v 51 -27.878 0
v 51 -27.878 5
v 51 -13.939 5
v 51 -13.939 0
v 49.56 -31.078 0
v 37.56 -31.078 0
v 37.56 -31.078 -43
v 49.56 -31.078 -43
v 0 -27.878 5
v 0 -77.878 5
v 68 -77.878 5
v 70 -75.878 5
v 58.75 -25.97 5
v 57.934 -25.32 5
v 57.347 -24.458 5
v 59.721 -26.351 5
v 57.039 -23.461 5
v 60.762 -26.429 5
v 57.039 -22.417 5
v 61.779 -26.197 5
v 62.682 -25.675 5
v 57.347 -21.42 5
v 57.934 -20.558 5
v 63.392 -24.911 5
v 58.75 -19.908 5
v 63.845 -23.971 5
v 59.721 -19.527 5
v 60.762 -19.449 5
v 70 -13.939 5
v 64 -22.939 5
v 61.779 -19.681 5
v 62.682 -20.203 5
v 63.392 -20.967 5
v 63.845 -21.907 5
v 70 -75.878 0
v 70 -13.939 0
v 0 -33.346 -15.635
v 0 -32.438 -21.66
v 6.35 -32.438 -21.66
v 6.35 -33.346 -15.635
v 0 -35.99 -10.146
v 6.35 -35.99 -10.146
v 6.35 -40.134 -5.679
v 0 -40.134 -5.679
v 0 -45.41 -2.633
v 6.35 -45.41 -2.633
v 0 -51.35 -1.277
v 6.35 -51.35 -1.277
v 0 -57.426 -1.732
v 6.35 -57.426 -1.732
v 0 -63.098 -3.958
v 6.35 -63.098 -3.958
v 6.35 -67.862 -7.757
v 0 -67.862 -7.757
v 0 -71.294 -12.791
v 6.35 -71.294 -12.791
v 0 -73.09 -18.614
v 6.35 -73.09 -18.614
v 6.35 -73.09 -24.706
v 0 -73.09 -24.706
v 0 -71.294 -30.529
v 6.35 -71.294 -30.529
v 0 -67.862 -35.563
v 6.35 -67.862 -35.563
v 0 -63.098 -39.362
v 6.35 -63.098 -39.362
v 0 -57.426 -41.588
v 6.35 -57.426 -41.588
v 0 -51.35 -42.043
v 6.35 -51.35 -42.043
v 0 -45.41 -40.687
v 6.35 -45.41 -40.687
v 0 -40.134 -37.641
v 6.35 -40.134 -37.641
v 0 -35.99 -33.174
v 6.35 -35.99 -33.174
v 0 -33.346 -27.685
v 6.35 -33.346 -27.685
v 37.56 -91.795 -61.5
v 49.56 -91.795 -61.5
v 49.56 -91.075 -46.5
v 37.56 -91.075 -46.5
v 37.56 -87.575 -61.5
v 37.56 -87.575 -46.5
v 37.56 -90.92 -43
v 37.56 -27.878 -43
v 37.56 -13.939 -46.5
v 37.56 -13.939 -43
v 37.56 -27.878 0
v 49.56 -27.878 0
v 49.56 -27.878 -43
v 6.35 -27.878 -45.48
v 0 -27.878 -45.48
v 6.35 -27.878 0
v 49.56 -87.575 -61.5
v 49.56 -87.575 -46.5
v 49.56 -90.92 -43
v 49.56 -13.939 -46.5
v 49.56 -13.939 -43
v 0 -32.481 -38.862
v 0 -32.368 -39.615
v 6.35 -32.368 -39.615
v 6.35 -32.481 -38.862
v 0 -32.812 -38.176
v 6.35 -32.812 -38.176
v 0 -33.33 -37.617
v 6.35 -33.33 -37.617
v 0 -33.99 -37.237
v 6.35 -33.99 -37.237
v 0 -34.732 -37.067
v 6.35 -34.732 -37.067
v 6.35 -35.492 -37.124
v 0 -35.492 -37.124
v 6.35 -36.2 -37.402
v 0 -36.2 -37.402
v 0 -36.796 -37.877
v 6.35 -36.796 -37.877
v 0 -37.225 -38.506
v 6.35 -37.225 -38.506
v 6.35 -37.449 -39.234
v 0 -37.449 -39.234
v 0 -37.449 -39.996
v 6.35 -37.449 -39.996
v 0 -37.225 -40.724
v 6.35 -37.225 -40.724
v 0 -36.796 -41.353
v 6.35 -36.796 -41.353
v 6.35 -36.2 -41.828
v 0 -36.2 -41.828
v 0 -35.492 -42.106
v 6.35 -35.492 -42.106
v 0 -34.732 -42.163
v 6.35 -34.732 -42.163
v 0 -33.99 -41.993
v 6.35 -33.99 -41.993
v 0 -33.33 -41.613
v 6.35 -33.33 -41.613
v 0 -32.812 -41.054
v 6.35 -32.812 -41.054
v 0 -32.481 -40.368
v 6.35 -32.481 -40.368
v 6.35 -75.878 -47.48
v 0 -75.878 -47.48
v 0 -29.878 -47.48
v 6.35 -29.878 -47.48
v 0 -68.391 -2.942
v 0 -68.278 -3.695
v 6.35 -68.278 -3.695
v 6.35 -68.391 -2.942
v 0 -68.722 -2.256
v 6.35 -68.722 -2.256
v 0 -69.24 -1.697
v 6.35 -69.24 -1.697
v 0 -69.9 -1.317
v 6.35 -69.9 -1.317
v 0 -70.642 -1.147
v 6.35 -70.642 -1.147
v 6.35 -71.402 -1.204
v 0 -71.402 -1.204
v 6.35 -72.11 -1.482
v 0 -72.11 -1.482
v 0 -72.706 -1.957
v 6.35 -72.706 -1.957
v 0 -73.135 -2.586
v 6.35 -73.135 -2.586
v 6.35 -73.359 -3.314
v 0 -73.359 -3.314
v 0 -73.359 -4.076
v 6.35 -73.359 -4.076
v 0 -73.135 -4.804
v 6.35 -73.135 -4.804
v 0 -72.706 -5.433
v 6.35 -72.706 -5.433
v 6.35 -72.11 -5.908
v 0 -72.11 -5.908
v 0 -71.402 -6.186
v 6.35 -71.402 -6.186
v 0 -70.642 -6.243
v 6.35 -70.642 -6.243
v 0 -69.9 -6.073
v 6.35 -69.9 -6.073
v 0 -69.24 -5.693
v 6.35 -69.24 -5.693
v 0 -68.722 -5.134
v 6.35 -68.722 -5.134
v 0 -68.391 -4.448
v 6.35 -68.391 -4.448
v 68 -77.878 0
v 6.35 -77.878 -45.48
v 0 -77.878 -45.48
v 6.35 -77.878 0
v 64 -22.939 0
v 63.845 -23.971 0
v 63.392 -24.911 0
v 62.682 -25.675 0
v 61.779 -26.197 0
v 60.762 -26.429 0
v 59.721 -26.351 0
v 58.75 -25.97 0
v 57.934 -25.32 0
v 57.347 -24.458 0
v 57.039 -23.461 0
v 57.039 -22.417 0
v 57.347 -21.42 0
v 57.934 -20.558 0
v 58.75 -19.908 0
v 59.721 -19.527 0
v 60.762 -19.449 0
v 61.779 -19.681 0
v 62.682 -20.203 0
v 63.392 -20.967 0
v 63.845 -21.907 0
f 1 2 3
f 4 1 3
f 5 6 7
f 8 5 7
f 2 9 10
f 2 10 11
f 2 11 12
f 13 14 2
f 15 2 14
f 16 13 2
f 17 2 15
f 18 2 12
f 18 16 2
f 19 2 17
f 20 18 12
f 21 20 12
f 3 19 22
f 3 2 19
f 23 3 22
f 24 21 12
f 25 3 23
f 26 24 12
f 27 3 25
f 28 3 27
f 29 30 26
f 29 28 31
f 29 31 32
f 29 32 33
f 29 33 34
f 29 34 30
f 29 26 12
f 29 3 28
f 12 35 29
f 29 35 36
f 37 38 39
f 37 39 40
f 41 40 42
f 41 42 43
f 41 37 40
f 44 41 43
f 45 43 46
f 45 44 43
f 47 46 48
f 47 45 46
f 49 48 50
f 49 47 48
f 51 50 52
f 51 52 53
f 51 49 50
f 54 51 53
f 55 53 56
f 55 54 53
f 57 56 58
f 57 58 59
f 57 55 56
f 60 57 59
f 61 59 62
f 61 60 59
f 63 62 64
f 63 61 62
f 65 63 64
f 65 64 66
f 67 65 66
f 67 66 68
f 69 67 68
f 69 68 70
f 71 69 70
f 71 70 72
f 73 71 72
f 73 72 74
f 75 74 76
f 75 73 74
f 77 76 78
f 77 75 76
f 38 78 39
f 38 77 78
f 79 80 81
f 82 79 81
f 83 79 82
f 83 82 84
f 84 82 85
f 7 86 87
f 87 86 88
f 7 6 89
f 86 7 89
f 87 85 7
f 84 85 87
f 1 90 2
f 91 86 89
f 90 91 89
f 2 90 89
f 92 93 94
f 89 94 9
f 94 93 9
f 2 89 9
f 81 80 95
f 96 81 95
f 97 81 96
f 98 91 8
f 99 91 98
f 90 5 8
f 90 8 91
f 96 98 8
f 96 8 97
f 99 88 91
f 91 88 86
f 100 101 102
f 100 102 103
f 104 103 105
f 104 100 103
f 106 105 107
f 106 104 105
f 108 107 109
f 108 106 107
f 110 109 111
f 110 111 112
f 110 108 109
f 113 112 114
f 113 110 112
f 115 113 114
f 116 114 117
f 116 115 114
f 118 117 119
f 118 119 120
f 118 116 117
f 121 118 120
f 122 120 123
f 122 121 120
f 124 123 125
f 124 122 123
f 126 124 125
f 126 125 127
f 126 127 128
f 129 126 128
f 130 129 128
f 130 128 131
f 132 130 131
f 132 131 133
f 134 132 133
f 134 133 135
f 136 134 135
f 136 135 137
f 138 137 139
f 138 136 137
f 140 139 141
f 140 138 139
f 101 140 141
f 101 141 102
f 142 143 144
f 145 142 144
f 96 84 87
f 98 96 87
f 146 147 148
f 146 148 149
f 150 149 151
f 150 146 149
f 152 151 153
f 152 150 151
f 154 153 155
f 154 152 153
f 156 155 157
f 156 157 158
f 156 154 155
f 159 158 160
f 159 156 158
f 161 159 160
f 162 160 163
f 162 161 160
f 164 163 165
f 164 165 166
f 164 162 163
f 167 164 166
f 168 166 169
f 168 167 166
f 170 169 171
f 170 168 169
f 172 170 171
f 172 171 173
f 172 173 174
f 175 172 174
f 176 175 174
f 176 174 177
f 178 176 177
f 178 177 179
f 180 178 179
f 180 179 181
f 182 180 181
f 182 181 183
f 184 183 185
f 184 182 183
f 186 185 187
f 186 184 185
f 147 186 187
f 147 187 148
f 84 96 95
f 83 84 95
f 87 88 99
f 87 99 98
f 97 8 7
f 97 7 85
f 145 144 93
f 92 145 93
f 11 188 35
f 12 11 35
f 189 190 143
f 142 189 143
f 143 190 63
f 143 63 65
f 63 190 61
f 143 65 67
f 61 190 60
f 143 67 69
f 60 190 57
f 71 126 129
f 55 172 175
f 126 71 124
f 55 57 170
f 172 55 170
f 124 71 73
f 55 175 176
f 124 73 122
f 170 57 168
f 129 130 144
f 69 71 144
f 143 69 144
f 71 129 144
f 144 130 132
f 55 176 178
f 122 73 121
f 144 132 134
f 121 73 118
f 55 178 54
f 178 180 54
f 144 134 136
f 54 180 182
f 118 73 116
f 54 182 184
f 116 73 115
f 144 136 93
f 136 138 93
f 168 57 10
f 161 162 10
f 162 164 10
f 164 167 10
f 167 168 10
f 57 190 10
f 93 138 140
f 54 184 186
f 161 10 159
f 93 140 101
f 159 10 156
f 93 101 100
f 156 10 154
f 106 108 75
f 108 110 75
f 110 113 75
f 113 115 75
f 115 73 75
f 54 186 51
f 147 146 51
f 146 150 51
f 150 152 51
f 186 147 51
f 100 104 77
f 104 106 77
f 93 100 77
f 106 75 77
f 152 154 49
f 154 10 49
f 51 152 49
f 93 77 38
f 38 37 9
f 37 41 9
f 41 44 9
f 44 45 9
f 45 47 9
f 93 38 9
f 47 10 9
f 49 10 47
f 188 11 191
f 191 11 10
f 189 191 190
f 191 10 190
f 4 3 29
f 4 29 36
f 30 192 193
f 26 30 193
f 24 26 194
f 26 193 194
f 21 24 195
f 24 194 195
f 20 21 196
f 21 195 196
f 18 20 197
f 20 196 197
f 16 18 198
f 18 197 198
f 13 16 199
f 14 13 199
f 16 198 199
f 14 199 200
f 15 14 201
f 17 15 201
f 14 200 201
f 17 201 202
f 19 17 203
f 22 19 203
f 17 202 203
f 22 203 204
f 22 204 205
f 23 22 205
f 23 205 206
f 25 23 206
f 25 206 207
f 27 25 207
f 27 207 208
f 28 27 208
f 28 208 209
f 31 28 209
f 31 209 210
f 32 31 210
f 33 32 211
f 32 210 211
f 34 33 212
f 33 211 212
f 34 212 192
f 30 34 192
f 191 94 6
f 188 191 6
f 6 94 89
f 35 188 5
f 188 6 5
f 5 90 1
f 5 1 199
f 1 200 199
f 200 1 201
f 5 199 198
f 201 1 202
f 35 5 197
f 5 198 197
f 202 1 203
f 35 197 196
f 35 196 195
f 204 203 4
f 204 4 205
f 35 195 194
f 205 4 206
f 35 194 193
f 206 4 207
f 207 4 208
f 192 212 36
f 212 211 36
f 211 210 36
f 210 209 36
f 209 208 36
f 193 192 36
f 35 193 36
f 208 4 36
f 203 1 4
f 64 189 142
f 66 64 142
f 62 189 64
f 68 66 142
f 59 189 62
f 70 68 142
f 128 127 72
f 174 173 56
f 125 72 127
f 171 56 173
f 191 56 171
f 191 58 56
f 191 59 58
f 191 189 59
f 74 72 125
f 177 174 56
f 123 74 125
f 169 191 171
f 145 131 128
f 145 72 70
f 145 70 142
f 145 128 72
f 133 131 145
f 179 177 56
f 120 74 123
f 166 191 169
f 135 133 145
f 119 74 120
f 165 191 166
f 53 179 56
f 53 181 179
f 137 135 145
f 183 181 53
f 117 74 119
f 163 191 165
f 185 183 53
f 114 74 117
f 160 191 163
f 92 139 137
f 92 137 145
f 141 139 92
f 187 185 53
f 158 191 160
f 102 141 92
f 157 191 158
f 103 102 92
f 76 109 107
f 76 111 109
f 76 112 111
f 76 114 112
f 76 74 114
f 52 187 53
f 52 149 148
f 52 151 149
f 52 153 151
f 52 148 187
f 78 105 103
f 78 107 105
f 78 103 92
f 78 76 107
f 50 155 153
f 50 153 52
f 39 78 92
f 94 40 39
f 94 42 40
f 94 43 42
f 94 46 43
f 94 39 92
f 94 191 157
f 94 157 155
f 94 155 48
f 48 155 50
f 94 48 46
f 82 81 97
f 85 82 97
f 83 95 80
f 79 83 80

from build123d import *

# Parameters (mm, degrees)
BOSS_EXTRUDE1_DEPTH   = 5
SKETCH2_W             = 6.35
SKETCH2_H             = 50
BOSS_EXTRUDE2_DEPTH   = 52.48
CUT_EXTRUDE1_REACH    = 106.448
SKETCH3_R             = 20.44
SKETCH3_R_2           = 2.555
SKETCH3_W             = 5
SKETCH3_H             = 50
CUT_EXTRUDE2_REACH    = 108.104
SKETCH4_R             = 3.5
CUT_EXTRUDE6_REACH    = 108.104
SKETCH14_W            = 23.196263878
SKETCH14_H            = 15.316152196
SKETCH15_W            = 12
SKETCH15_H            = 3.2
BOSS_EXTRUDE7_DEPTH   = 46.5
BOSS_EXTRUDE8_REACH   = 98.667
SKETCH16_W            = 12
SKETCH16_H            = 3.5
SKETCH17_W            = 12
SKETCH17_H            = 3.5
BOSS_EXTRUDE9_DEPTH   = 15
CHAMFER2_SIZE         = 2
SKETCH22_W            = 12
SKETCH22_H            = 15
BOSS_EXTRUDE10_DEPTH  = 0.72
CUT_EXTRUDE8_REACH    = 103.606
CUT_EXTRUDE7_REACH    = 120.762
SKETCH18_R            = 3.25
MIRROR2_OUTLINE_W     = 50
MIRROR2_OUTLINE_H     = 5
MIRROR2_DEPTH         = 68
MIRROR2_2_OUTLINE_R   = 2.555
MIRROR2_2_OUTLINE_R_2 = 20.44
MIRROR2_2_DEPTH       = 6.35
MIRROR2_START         = 37.56
MIRROR2_3_DEPTH       = 12
MIRROR2_START_2       = 51
MIRROR2_4_OUTLINE_W   = 13.938985111
MIRROR2_4_OUTLINE_H   = 5
MIRROR2_4_DEPTH       = 5.9999999
MIRROR2_START_3       = 64.0000001
MIRROR2_5_OUTLINE_W   = 13.938985111
MIRROR2_5_OUTLINE_H   = 5
MIRROR2_5_DEPTH       = 5.9999999
MIRROR2_6_DEPTH       = 5
BOSS_EXTRUDE11_DEPTH  = 12
CUT_EXTRUDE9_REACH    = 132.799
SKETCH26_W            = 121.241742099
SKETCH26_H            = 103.992632166


with BuildPart() as part:
    # Sketch1 → Boss-Extrude1 (new body)
    with BuildSketch(Plane.XY):
        Polygon((0, 0), (0, 50), (51, 50), (51, 64.061014889), (70, 64.061014889), (70, -13.938985111), (51, -13.938985111), (51, 0), align=None)
    extrude(amount=BOSS_EXTRUDE1_DEPTH)

    # Sketch2 → Boss-Extrude2 (add)
    with BuildSketch(Plane(origin=(0, 0, 0), x_dir=(-1, 0, 0), z_dir=(0, 0, -1))):
        with Locations((-3.175, 25)):
            Rectangle(SKETCH2_W, SKETCH2_H)
    extrude(amount=BOSS_EXTRUDE2_DEPTH)

    # Sketch3 → Cut-Extrude1 (cut, up to next)
    with BuildSketch(Plane(origin=(6.35, 0, 0), x_dir=(0, 0, -1), z_dir=(1, 0, 0)), mode=Mode.PRIVATE) as cut_extrude1_sk1:
        with Locations((21.66, 25)):
            Circle(SKETCH3_R)
    cut_extrude1_tool1 = extrude(cut_extrude1_sk1.sketch, amount=-CUT_EXTRUDE1_REACH, mode=Mode.PRIVATE) & part.part
    # Sketch3 → Cut-Extrude1 (cut, up to next)
    with BuildSketch(Plane(origin=(6.35, 0, 0), x_dir=(0, 0, -1), z_dir=(1, 0, 0)), mode=Mode.PRIVATE) as cut_extrude1_sk2:
        with Locations((3.695, 42.955)):
            Circle(SKETCH3_R_2)
    cut_extrude1_tool2 = extrude(cut_extrude1_sk2.sketch, amount=-CUT_EXTRUDE1_REACH, mode=Mode.PRIVATE) & part.part
    # Sketch3 → Cut-Extrude1 (cut, up to next)
    with BuildSketch(Plane(origin=(6.35, 0, 0), x_dir=(0, 0, -1), z_dir=(1, 0, 0)), mode=Mode.PRIVATE) as cut_extrude1_sk3:
        with Locations((39.615, 7.045)):
            Circle(SKETCH3_R_2)
    cut_extrude1_tool3 = extrude(cut_extrude1_sk3.sketch, amount=-CUT_EXTRUDE1_REACH, mode=Mode.PRIVATE) & part.part
    # Sketch3 → Cut-Extrude1 (cut, up to next)
    with BuildSketch(Plane(origin=(6.35, 0, 0), x_dir=(0, 0, -1), z_dir=(1, 0, 0)), mode=Mode.PRIVATE) as cut_extrude1_sk4:
        with Locations((49.98, 25)):
            Rectangle(SKETCH3_W, SKETCH3_H)
    cut_extrude1_tool4 = extrude(cut_extrude1_sk4.sketch, amount=-CUT_EXTRUDE1_REACH, mode=Mode.PRIVATE) & part.part
    add(cut_extrude1_tool1.solids().sort_by_distance((6.35, 25, -21.66))[0], mode=Mode.SUBTRACT)
    add(cut_extrude1_tool2.solids().sort_by_distance((6.35, 42.955, -3.695))[0], mode=Mode.SUBTRACT)
    add(cut_extrude1_tool3.solids().sort_by_distance((6.35, 7.045, -39.615))[0], mode=Mode.SUBTRACT)
    add(cut_extrude1_tool4.solids().sort_by_distance((6.35, 25, -49.98))[0], mode=Mode.SUBTRACT)

    # Sketch4 → Cut-Extrude2 (cut, up to next)
    with BuildSketch(Plane(origin=(0, 0, 0), x_dir=(-1, 0, 0), z_dir=(0, 0, -1)), mode=Mode.PRIVATE) as cut_extrude2_sk1:
        with Locations((-60.5, 55.061014889)):
            Circle(SKETCH4_R)
    cut_extrude2_tool1 = extrude(cut_extrude2_sk1.sketch, amount=-CUT_EXTRUDE2_REACH, mode=Mode.PRIVATE) & part.part
    # Sketch4 → Cut-Extrude2 (cut, up to next)
    with BuildSketch(Plane(origin=(0, 0, 0), x_dir=(-1, 0, 0), z_dir=(0, 0, -1)), mode=Mode.PRIVATE) as cut_extrude2_sk2:
        with Locations((-60.5, -4.938985111)):
            Circle(SKETCH4_R)
    cut_extrude2_tool2 = extrude(cut_extrude2_sk2.sketch, amount=-CUT_EXTRUDE2_REACH, mode=Mode.PRIVATE) & part.part
    add(cut_extrude2_tool1.solids().sort_by_distance((60.5, 55.061015, 0))[0], mode=Mode.SUBTRACT)
    add(cut_extrude2_tool2.solids().sort_by_distance((60.5, -4.938985, 0))[0], mode=Mode.SUBTRACT)

    # Sketch14 → Cut-Extrude6 (cut, up to next)
    with BuildSketch(Plane(origin=(0, 0, 0), x_dir=(-1, 0, 0), z_dir=(0, 0, -1)), mode=Mode.PRIVATE) as cut_extrude6_sk1:
        with Locations((-62.598131939, 57.658076098)):
            Rectangle(SKETCH14_W, SKETCH14_H)
    cut_extrude6_tool1 = extrude(cut_extrude6_sk1.sketch, amount=-CUT_EXTRUDE6_REACH, mode=Mode.PRIVATE) & part.part
    add(cut_extrude6_tool1.solids().sort_by_distance((62.598132, 57.658076, 0))[0], mode=Mode.SUBTRACT)

    # Sketch15 → Boss-Extrude7 (add)
    with BuildSketch(Plane(origin=(0, 0, 0), x_dir=(-1, 0, 0), z_dir=(0, 0, -1))):
        with Locations((-43.56, 1.6)):
            Rectangle(SKETCH15_W, SKETCH15_H)
    extrude(amount=BOSS_EXTRUDE7_DEPTH)

    # Boss-Extrude8: up to this plane
    boss_extrude8_end = Plane(origin=(166.832994776, 64.085435133, -66.619565524), z_dir=(-1.1416993347548052e-15, 0.9990256874715413, 0.04413247978546202))
    # Sketch16 → Boss-Extrude8 (add, up to the surface)
    with BuildSketch(Plane(origin=(0, 3.2, 0), x_dir=(1, 0, 0), z_dir=(0, 1, 0)), mode=Mode.PRIVATE) as boss_extrude8_sk1:
        with Locations((43.56, 44.75)):
            Rectangle(SKETCH16_W, SKETCH16_H)
    boss_extrude8_tool1 = split(extrude(boss_extrude8_sk1.sketch, amount=BOSS_EXTRUDE8_REACH, mode=Mode.PRIVATE), bisect_by=boss_extrude8_end, keep=Keep.BOTH, mode=Mode.PRIVATE)
    add(boss_extrude8_tool1.solids().sort_by_distance((43.56, 3.2, -44.75))[0])

    # Sketch17 → Boss-Extrude9 (add)
    with BuildSketch(Plane(origin=(0, 0, -46.5), x_dir=(-1, 0, 0), z_dir=(0, 0, -1))):
        with Locations((-43.56, 61.446642853)):
            Rectangle(SKETCH17_W, SKETCH17_H)
    extrude(amount=BOSS_EXTRUDE9_DEPTH)

    # Chamfer2
    chamfer2_edges = [part.edges().sort_by_distance(p)[0] for p in [
        (3.175, 0, -47.48),
        (3.175, 50, -47.48),
        (70, 50, 2.5),
    ]]
    chamfer(chamfer2_edges, length=CHAMFER2_SIZE)

    # Sketch22 → Boss-Extrude10 (add)
    with BuildSketch(Plane(origin=(0, 63.196642853, 0), x_dir=(1, 0, 0), z_dir=(0, 1, 0))):
        with Locations((43.56, 54)):
            Rectangle(SKETCH22_W, SKETCH22_H)
    extrude(amount=BOSS_EXTRUDE10_DEPTH)

    # Sketch23 → Cut-Extrude8 (cut, up to next)
    with BuildSketch(Plane(origin=(49.56, 0, 0), x_dir=(0, 0, -1), z_dir=(1, 0, 0)), mode=Mode.PRIVATE) as cut_extrude8_sk1:
        Polygon((46.5, 63.916642853), (46.5, 63.196642853), (61.5, 63.916642853), align=None)
    cut_extrude8_tool1 = extrude(cut_extrude8_sk1.sketch, amount=-CUT_EXTRUDE8_REACH, mode=Mode.PRIVATE) & part.part
    add(cut_extrude8_tool1.solids().sort_by_distance((49.56, 63.676643, -51.5))[0], mode=Mode.SUBTRACT)

    # Cut-Extrude7: up to this plane
    cut_extrude7_end = Plane(origin=(-0.001, 63.196642853, -46.5), z_dir=(-2.1659106514416256e-15, -0.9988499868416298, -0.04794479936839813))
    # Sketch18 → Cut-Extrude7 (cut, up to the surface)
    with BuildSketch(Plane.XZ.offset(-59.696642853), mode=Mode.PRIVATE) as cut_extrude7_sk1:
        with Locations(Location((43.56, -52.57, 0), (0, 0, 270))):
            Circle(SKETCH18_R)
    cut_extrude7_tool1 = split(extrude(cut_extrude7_sk1.sketch, amount=-CUT_EXTRUDE7_REACH, mode=Mode.PRIVATE), bisect_by=cut_extrude7_end, keep=Keep.BOTH, mode=Mode.PRIVATE)
    add(cut_extrude7_tool1.solids().sort_by_distance((43.56, 59.696643, -52.57))[0], mode=Mode.SUBTRACT)



with BuildPart() as body_2:
    # Mirror2: read off the stored shape, not the designer's step
    # Mirror2 outline → Mirror2 (new body)
    with BuildSketch(Plane.YZ):
        with Locations((-52.877970222, 2.5)):
            Rectangle(MIRROR2_OUTLINE_W, MIRROR2_OUTLINE_H)
    extrude(amount=MIRROR2_DEPTH)

    # Mirror2 2 outline → Mirror2 2 (add)
    with BuildSketch(Plane.YZ):
        Polygon((-27.877970222, -45.48), (-27.877970222, 0), (-77.877970222, 0), (-77.877970222, -45.48), (-75.877970222, -47.48), (-29.877970222, -47.48), align=None)
        with Locations((-34.922970222, -39.615)):
            Circle(MIRROR2_2_OUTLINE_R, mode=Mode.SUBTRACT)
        with Locations((-70.832970222, -3.695)):
            Circle(MIRROR2_2_OUTLINE_R, mode=Mode.SUBTRACT)
        with Locations((-52.877970222, -21.66)):
            Circle(MIRROR2_2_OUTLINE_R_2, mode=Mode.SUBTRACT)
    extrude(amount=MIRROR2_2_DEPTH)


with BuildPart() as part_1:
    add(part.part)

    add(body_2.part)  # Mirror2 3 merges body 2
    # Mirror2 3 outline → Mirror2 3 (add)
    with BuildSketch(Plane.YZ.offset(MIRROR2_START)):
        Polygon((-31.077970222, -46.5), (0, -46.5), (0, -43), (-27.877970222, -43), (-27.877970222, 0), (-31.077970222, 0), align=None)
    extrude(amount=MIRROR2_3_DEPTH)

    # Mirror2 4 outline → Mirror2 4 (add)
    with BuildSketch(Plane.YZ.offset(MIRROR2_START_2)):
        with Locations((-20.908477667, 2.5)):
            Rectangle(MIRROR2_4_OUTLINE_W, MIRROR2_4_OUTLINE_H)
    extrude(amount=MIRROR2_4_DEPTH)

    # Mirror2 5 outline → Mirror2 5 (add)
    with BuildSketch(Plane.YZ.offset(MIRROR2_START_3)):
        with Locations((-20.908477667, 2.5)):
            Rectangle(MIRROR2_5_OUTLINE_W, MIRROR2_5_OUTLINE_H)
    extrude(amount=MIRROR2_5_DEPTH)

    # Mirror2 6 outline → Mirror2 6 (add)
    with BuildSketch(Plane.XY):
        Polygon((70, -75.877970222), (70, -27.877970222), (68, -27.877970222), (68, -77.877970222), align=None)
        with BuildLine():
            Line((64.0000001, -27.877970222), (64, -22.938985111))
            ThreePointArc((64, -22.938985111), (60.5, -26.438985111), (57, -22.938985111))
            Line((57, -22.938985111), (56.9999999, -27.877970222))
            Line((56.9999999, -27.877970222), (64.0000001, -27.877970222))
        make_face()
        with BuildLine():
            ThreePointArc((57, -22.938985111), (60.5, -19.438985111), (64, -22.938985111))
            Line((64, -22.938985111), (64.0000001, -13.938985111))
            Line((64.0000001, -13.938985111), (56.9999999, -13.938985111))
            Line((56.9999999, -13.938985111), (57, -22.938985111))
        make_face()
    extrude(amount=MIRROR2_6_DEPTH)

    # Sketch25 → Boss-Extrude11 (add)
    with BuildSketch(Plane(origin=(49.56, 0, 0), x_dir=(0, 0, -1), z_dir=(1, 0, 0))):
        Polygon((43, -13.938985111), (46.5, -13.938985111), (46.5, -87.574613075), (61.5, -87.574613075), (61.5, -91.794613075), (46.5, -91.074613075), (43, -90.919998753), (43, -31.077970222), align=None)
    extrude(amount=-BOSS_EXTRUDE11_DEPTH)

    # Cut-Extrude9: up to this face of the body (flat: up to its plane)
    cut_extrude9_end = Plane(part_1.part.faces().sort_by_distance((0, 0.724855186, -20.24))[0])
    # Sketch26 → Cut-Extrude9 (cut, up to the picked face)
    with BuildSketch(Plane(origin=(70, 0, 0), x_dir=(0, 0, -1), z_dir=(1, 0, 0)), mode=Mode.PRIVATE) as cut_extrude9_sk1:
        with Locations((55.62087105, 38.057330972)):
            Rectangle(SKETCH26_W, SKETCH26_H)
    cut_extrude9_tool1 = split(extrude(cut_extrude9_sk1.sketch, amount=-CUT_EXTRUDE9_REACH, mode=Mode.PRIVATE), bisect_by=cut_extrude9_end, keep=Keep.BOTH, mode=Mode.PRIVATE)
    add(cut_extrude9_tool1.solids().sort_by(Axis((70, 38.057331, -55.620871), (-1, 0, 0)))[0], mode=Mode.SUBTRACT)


solid = part_1.part
